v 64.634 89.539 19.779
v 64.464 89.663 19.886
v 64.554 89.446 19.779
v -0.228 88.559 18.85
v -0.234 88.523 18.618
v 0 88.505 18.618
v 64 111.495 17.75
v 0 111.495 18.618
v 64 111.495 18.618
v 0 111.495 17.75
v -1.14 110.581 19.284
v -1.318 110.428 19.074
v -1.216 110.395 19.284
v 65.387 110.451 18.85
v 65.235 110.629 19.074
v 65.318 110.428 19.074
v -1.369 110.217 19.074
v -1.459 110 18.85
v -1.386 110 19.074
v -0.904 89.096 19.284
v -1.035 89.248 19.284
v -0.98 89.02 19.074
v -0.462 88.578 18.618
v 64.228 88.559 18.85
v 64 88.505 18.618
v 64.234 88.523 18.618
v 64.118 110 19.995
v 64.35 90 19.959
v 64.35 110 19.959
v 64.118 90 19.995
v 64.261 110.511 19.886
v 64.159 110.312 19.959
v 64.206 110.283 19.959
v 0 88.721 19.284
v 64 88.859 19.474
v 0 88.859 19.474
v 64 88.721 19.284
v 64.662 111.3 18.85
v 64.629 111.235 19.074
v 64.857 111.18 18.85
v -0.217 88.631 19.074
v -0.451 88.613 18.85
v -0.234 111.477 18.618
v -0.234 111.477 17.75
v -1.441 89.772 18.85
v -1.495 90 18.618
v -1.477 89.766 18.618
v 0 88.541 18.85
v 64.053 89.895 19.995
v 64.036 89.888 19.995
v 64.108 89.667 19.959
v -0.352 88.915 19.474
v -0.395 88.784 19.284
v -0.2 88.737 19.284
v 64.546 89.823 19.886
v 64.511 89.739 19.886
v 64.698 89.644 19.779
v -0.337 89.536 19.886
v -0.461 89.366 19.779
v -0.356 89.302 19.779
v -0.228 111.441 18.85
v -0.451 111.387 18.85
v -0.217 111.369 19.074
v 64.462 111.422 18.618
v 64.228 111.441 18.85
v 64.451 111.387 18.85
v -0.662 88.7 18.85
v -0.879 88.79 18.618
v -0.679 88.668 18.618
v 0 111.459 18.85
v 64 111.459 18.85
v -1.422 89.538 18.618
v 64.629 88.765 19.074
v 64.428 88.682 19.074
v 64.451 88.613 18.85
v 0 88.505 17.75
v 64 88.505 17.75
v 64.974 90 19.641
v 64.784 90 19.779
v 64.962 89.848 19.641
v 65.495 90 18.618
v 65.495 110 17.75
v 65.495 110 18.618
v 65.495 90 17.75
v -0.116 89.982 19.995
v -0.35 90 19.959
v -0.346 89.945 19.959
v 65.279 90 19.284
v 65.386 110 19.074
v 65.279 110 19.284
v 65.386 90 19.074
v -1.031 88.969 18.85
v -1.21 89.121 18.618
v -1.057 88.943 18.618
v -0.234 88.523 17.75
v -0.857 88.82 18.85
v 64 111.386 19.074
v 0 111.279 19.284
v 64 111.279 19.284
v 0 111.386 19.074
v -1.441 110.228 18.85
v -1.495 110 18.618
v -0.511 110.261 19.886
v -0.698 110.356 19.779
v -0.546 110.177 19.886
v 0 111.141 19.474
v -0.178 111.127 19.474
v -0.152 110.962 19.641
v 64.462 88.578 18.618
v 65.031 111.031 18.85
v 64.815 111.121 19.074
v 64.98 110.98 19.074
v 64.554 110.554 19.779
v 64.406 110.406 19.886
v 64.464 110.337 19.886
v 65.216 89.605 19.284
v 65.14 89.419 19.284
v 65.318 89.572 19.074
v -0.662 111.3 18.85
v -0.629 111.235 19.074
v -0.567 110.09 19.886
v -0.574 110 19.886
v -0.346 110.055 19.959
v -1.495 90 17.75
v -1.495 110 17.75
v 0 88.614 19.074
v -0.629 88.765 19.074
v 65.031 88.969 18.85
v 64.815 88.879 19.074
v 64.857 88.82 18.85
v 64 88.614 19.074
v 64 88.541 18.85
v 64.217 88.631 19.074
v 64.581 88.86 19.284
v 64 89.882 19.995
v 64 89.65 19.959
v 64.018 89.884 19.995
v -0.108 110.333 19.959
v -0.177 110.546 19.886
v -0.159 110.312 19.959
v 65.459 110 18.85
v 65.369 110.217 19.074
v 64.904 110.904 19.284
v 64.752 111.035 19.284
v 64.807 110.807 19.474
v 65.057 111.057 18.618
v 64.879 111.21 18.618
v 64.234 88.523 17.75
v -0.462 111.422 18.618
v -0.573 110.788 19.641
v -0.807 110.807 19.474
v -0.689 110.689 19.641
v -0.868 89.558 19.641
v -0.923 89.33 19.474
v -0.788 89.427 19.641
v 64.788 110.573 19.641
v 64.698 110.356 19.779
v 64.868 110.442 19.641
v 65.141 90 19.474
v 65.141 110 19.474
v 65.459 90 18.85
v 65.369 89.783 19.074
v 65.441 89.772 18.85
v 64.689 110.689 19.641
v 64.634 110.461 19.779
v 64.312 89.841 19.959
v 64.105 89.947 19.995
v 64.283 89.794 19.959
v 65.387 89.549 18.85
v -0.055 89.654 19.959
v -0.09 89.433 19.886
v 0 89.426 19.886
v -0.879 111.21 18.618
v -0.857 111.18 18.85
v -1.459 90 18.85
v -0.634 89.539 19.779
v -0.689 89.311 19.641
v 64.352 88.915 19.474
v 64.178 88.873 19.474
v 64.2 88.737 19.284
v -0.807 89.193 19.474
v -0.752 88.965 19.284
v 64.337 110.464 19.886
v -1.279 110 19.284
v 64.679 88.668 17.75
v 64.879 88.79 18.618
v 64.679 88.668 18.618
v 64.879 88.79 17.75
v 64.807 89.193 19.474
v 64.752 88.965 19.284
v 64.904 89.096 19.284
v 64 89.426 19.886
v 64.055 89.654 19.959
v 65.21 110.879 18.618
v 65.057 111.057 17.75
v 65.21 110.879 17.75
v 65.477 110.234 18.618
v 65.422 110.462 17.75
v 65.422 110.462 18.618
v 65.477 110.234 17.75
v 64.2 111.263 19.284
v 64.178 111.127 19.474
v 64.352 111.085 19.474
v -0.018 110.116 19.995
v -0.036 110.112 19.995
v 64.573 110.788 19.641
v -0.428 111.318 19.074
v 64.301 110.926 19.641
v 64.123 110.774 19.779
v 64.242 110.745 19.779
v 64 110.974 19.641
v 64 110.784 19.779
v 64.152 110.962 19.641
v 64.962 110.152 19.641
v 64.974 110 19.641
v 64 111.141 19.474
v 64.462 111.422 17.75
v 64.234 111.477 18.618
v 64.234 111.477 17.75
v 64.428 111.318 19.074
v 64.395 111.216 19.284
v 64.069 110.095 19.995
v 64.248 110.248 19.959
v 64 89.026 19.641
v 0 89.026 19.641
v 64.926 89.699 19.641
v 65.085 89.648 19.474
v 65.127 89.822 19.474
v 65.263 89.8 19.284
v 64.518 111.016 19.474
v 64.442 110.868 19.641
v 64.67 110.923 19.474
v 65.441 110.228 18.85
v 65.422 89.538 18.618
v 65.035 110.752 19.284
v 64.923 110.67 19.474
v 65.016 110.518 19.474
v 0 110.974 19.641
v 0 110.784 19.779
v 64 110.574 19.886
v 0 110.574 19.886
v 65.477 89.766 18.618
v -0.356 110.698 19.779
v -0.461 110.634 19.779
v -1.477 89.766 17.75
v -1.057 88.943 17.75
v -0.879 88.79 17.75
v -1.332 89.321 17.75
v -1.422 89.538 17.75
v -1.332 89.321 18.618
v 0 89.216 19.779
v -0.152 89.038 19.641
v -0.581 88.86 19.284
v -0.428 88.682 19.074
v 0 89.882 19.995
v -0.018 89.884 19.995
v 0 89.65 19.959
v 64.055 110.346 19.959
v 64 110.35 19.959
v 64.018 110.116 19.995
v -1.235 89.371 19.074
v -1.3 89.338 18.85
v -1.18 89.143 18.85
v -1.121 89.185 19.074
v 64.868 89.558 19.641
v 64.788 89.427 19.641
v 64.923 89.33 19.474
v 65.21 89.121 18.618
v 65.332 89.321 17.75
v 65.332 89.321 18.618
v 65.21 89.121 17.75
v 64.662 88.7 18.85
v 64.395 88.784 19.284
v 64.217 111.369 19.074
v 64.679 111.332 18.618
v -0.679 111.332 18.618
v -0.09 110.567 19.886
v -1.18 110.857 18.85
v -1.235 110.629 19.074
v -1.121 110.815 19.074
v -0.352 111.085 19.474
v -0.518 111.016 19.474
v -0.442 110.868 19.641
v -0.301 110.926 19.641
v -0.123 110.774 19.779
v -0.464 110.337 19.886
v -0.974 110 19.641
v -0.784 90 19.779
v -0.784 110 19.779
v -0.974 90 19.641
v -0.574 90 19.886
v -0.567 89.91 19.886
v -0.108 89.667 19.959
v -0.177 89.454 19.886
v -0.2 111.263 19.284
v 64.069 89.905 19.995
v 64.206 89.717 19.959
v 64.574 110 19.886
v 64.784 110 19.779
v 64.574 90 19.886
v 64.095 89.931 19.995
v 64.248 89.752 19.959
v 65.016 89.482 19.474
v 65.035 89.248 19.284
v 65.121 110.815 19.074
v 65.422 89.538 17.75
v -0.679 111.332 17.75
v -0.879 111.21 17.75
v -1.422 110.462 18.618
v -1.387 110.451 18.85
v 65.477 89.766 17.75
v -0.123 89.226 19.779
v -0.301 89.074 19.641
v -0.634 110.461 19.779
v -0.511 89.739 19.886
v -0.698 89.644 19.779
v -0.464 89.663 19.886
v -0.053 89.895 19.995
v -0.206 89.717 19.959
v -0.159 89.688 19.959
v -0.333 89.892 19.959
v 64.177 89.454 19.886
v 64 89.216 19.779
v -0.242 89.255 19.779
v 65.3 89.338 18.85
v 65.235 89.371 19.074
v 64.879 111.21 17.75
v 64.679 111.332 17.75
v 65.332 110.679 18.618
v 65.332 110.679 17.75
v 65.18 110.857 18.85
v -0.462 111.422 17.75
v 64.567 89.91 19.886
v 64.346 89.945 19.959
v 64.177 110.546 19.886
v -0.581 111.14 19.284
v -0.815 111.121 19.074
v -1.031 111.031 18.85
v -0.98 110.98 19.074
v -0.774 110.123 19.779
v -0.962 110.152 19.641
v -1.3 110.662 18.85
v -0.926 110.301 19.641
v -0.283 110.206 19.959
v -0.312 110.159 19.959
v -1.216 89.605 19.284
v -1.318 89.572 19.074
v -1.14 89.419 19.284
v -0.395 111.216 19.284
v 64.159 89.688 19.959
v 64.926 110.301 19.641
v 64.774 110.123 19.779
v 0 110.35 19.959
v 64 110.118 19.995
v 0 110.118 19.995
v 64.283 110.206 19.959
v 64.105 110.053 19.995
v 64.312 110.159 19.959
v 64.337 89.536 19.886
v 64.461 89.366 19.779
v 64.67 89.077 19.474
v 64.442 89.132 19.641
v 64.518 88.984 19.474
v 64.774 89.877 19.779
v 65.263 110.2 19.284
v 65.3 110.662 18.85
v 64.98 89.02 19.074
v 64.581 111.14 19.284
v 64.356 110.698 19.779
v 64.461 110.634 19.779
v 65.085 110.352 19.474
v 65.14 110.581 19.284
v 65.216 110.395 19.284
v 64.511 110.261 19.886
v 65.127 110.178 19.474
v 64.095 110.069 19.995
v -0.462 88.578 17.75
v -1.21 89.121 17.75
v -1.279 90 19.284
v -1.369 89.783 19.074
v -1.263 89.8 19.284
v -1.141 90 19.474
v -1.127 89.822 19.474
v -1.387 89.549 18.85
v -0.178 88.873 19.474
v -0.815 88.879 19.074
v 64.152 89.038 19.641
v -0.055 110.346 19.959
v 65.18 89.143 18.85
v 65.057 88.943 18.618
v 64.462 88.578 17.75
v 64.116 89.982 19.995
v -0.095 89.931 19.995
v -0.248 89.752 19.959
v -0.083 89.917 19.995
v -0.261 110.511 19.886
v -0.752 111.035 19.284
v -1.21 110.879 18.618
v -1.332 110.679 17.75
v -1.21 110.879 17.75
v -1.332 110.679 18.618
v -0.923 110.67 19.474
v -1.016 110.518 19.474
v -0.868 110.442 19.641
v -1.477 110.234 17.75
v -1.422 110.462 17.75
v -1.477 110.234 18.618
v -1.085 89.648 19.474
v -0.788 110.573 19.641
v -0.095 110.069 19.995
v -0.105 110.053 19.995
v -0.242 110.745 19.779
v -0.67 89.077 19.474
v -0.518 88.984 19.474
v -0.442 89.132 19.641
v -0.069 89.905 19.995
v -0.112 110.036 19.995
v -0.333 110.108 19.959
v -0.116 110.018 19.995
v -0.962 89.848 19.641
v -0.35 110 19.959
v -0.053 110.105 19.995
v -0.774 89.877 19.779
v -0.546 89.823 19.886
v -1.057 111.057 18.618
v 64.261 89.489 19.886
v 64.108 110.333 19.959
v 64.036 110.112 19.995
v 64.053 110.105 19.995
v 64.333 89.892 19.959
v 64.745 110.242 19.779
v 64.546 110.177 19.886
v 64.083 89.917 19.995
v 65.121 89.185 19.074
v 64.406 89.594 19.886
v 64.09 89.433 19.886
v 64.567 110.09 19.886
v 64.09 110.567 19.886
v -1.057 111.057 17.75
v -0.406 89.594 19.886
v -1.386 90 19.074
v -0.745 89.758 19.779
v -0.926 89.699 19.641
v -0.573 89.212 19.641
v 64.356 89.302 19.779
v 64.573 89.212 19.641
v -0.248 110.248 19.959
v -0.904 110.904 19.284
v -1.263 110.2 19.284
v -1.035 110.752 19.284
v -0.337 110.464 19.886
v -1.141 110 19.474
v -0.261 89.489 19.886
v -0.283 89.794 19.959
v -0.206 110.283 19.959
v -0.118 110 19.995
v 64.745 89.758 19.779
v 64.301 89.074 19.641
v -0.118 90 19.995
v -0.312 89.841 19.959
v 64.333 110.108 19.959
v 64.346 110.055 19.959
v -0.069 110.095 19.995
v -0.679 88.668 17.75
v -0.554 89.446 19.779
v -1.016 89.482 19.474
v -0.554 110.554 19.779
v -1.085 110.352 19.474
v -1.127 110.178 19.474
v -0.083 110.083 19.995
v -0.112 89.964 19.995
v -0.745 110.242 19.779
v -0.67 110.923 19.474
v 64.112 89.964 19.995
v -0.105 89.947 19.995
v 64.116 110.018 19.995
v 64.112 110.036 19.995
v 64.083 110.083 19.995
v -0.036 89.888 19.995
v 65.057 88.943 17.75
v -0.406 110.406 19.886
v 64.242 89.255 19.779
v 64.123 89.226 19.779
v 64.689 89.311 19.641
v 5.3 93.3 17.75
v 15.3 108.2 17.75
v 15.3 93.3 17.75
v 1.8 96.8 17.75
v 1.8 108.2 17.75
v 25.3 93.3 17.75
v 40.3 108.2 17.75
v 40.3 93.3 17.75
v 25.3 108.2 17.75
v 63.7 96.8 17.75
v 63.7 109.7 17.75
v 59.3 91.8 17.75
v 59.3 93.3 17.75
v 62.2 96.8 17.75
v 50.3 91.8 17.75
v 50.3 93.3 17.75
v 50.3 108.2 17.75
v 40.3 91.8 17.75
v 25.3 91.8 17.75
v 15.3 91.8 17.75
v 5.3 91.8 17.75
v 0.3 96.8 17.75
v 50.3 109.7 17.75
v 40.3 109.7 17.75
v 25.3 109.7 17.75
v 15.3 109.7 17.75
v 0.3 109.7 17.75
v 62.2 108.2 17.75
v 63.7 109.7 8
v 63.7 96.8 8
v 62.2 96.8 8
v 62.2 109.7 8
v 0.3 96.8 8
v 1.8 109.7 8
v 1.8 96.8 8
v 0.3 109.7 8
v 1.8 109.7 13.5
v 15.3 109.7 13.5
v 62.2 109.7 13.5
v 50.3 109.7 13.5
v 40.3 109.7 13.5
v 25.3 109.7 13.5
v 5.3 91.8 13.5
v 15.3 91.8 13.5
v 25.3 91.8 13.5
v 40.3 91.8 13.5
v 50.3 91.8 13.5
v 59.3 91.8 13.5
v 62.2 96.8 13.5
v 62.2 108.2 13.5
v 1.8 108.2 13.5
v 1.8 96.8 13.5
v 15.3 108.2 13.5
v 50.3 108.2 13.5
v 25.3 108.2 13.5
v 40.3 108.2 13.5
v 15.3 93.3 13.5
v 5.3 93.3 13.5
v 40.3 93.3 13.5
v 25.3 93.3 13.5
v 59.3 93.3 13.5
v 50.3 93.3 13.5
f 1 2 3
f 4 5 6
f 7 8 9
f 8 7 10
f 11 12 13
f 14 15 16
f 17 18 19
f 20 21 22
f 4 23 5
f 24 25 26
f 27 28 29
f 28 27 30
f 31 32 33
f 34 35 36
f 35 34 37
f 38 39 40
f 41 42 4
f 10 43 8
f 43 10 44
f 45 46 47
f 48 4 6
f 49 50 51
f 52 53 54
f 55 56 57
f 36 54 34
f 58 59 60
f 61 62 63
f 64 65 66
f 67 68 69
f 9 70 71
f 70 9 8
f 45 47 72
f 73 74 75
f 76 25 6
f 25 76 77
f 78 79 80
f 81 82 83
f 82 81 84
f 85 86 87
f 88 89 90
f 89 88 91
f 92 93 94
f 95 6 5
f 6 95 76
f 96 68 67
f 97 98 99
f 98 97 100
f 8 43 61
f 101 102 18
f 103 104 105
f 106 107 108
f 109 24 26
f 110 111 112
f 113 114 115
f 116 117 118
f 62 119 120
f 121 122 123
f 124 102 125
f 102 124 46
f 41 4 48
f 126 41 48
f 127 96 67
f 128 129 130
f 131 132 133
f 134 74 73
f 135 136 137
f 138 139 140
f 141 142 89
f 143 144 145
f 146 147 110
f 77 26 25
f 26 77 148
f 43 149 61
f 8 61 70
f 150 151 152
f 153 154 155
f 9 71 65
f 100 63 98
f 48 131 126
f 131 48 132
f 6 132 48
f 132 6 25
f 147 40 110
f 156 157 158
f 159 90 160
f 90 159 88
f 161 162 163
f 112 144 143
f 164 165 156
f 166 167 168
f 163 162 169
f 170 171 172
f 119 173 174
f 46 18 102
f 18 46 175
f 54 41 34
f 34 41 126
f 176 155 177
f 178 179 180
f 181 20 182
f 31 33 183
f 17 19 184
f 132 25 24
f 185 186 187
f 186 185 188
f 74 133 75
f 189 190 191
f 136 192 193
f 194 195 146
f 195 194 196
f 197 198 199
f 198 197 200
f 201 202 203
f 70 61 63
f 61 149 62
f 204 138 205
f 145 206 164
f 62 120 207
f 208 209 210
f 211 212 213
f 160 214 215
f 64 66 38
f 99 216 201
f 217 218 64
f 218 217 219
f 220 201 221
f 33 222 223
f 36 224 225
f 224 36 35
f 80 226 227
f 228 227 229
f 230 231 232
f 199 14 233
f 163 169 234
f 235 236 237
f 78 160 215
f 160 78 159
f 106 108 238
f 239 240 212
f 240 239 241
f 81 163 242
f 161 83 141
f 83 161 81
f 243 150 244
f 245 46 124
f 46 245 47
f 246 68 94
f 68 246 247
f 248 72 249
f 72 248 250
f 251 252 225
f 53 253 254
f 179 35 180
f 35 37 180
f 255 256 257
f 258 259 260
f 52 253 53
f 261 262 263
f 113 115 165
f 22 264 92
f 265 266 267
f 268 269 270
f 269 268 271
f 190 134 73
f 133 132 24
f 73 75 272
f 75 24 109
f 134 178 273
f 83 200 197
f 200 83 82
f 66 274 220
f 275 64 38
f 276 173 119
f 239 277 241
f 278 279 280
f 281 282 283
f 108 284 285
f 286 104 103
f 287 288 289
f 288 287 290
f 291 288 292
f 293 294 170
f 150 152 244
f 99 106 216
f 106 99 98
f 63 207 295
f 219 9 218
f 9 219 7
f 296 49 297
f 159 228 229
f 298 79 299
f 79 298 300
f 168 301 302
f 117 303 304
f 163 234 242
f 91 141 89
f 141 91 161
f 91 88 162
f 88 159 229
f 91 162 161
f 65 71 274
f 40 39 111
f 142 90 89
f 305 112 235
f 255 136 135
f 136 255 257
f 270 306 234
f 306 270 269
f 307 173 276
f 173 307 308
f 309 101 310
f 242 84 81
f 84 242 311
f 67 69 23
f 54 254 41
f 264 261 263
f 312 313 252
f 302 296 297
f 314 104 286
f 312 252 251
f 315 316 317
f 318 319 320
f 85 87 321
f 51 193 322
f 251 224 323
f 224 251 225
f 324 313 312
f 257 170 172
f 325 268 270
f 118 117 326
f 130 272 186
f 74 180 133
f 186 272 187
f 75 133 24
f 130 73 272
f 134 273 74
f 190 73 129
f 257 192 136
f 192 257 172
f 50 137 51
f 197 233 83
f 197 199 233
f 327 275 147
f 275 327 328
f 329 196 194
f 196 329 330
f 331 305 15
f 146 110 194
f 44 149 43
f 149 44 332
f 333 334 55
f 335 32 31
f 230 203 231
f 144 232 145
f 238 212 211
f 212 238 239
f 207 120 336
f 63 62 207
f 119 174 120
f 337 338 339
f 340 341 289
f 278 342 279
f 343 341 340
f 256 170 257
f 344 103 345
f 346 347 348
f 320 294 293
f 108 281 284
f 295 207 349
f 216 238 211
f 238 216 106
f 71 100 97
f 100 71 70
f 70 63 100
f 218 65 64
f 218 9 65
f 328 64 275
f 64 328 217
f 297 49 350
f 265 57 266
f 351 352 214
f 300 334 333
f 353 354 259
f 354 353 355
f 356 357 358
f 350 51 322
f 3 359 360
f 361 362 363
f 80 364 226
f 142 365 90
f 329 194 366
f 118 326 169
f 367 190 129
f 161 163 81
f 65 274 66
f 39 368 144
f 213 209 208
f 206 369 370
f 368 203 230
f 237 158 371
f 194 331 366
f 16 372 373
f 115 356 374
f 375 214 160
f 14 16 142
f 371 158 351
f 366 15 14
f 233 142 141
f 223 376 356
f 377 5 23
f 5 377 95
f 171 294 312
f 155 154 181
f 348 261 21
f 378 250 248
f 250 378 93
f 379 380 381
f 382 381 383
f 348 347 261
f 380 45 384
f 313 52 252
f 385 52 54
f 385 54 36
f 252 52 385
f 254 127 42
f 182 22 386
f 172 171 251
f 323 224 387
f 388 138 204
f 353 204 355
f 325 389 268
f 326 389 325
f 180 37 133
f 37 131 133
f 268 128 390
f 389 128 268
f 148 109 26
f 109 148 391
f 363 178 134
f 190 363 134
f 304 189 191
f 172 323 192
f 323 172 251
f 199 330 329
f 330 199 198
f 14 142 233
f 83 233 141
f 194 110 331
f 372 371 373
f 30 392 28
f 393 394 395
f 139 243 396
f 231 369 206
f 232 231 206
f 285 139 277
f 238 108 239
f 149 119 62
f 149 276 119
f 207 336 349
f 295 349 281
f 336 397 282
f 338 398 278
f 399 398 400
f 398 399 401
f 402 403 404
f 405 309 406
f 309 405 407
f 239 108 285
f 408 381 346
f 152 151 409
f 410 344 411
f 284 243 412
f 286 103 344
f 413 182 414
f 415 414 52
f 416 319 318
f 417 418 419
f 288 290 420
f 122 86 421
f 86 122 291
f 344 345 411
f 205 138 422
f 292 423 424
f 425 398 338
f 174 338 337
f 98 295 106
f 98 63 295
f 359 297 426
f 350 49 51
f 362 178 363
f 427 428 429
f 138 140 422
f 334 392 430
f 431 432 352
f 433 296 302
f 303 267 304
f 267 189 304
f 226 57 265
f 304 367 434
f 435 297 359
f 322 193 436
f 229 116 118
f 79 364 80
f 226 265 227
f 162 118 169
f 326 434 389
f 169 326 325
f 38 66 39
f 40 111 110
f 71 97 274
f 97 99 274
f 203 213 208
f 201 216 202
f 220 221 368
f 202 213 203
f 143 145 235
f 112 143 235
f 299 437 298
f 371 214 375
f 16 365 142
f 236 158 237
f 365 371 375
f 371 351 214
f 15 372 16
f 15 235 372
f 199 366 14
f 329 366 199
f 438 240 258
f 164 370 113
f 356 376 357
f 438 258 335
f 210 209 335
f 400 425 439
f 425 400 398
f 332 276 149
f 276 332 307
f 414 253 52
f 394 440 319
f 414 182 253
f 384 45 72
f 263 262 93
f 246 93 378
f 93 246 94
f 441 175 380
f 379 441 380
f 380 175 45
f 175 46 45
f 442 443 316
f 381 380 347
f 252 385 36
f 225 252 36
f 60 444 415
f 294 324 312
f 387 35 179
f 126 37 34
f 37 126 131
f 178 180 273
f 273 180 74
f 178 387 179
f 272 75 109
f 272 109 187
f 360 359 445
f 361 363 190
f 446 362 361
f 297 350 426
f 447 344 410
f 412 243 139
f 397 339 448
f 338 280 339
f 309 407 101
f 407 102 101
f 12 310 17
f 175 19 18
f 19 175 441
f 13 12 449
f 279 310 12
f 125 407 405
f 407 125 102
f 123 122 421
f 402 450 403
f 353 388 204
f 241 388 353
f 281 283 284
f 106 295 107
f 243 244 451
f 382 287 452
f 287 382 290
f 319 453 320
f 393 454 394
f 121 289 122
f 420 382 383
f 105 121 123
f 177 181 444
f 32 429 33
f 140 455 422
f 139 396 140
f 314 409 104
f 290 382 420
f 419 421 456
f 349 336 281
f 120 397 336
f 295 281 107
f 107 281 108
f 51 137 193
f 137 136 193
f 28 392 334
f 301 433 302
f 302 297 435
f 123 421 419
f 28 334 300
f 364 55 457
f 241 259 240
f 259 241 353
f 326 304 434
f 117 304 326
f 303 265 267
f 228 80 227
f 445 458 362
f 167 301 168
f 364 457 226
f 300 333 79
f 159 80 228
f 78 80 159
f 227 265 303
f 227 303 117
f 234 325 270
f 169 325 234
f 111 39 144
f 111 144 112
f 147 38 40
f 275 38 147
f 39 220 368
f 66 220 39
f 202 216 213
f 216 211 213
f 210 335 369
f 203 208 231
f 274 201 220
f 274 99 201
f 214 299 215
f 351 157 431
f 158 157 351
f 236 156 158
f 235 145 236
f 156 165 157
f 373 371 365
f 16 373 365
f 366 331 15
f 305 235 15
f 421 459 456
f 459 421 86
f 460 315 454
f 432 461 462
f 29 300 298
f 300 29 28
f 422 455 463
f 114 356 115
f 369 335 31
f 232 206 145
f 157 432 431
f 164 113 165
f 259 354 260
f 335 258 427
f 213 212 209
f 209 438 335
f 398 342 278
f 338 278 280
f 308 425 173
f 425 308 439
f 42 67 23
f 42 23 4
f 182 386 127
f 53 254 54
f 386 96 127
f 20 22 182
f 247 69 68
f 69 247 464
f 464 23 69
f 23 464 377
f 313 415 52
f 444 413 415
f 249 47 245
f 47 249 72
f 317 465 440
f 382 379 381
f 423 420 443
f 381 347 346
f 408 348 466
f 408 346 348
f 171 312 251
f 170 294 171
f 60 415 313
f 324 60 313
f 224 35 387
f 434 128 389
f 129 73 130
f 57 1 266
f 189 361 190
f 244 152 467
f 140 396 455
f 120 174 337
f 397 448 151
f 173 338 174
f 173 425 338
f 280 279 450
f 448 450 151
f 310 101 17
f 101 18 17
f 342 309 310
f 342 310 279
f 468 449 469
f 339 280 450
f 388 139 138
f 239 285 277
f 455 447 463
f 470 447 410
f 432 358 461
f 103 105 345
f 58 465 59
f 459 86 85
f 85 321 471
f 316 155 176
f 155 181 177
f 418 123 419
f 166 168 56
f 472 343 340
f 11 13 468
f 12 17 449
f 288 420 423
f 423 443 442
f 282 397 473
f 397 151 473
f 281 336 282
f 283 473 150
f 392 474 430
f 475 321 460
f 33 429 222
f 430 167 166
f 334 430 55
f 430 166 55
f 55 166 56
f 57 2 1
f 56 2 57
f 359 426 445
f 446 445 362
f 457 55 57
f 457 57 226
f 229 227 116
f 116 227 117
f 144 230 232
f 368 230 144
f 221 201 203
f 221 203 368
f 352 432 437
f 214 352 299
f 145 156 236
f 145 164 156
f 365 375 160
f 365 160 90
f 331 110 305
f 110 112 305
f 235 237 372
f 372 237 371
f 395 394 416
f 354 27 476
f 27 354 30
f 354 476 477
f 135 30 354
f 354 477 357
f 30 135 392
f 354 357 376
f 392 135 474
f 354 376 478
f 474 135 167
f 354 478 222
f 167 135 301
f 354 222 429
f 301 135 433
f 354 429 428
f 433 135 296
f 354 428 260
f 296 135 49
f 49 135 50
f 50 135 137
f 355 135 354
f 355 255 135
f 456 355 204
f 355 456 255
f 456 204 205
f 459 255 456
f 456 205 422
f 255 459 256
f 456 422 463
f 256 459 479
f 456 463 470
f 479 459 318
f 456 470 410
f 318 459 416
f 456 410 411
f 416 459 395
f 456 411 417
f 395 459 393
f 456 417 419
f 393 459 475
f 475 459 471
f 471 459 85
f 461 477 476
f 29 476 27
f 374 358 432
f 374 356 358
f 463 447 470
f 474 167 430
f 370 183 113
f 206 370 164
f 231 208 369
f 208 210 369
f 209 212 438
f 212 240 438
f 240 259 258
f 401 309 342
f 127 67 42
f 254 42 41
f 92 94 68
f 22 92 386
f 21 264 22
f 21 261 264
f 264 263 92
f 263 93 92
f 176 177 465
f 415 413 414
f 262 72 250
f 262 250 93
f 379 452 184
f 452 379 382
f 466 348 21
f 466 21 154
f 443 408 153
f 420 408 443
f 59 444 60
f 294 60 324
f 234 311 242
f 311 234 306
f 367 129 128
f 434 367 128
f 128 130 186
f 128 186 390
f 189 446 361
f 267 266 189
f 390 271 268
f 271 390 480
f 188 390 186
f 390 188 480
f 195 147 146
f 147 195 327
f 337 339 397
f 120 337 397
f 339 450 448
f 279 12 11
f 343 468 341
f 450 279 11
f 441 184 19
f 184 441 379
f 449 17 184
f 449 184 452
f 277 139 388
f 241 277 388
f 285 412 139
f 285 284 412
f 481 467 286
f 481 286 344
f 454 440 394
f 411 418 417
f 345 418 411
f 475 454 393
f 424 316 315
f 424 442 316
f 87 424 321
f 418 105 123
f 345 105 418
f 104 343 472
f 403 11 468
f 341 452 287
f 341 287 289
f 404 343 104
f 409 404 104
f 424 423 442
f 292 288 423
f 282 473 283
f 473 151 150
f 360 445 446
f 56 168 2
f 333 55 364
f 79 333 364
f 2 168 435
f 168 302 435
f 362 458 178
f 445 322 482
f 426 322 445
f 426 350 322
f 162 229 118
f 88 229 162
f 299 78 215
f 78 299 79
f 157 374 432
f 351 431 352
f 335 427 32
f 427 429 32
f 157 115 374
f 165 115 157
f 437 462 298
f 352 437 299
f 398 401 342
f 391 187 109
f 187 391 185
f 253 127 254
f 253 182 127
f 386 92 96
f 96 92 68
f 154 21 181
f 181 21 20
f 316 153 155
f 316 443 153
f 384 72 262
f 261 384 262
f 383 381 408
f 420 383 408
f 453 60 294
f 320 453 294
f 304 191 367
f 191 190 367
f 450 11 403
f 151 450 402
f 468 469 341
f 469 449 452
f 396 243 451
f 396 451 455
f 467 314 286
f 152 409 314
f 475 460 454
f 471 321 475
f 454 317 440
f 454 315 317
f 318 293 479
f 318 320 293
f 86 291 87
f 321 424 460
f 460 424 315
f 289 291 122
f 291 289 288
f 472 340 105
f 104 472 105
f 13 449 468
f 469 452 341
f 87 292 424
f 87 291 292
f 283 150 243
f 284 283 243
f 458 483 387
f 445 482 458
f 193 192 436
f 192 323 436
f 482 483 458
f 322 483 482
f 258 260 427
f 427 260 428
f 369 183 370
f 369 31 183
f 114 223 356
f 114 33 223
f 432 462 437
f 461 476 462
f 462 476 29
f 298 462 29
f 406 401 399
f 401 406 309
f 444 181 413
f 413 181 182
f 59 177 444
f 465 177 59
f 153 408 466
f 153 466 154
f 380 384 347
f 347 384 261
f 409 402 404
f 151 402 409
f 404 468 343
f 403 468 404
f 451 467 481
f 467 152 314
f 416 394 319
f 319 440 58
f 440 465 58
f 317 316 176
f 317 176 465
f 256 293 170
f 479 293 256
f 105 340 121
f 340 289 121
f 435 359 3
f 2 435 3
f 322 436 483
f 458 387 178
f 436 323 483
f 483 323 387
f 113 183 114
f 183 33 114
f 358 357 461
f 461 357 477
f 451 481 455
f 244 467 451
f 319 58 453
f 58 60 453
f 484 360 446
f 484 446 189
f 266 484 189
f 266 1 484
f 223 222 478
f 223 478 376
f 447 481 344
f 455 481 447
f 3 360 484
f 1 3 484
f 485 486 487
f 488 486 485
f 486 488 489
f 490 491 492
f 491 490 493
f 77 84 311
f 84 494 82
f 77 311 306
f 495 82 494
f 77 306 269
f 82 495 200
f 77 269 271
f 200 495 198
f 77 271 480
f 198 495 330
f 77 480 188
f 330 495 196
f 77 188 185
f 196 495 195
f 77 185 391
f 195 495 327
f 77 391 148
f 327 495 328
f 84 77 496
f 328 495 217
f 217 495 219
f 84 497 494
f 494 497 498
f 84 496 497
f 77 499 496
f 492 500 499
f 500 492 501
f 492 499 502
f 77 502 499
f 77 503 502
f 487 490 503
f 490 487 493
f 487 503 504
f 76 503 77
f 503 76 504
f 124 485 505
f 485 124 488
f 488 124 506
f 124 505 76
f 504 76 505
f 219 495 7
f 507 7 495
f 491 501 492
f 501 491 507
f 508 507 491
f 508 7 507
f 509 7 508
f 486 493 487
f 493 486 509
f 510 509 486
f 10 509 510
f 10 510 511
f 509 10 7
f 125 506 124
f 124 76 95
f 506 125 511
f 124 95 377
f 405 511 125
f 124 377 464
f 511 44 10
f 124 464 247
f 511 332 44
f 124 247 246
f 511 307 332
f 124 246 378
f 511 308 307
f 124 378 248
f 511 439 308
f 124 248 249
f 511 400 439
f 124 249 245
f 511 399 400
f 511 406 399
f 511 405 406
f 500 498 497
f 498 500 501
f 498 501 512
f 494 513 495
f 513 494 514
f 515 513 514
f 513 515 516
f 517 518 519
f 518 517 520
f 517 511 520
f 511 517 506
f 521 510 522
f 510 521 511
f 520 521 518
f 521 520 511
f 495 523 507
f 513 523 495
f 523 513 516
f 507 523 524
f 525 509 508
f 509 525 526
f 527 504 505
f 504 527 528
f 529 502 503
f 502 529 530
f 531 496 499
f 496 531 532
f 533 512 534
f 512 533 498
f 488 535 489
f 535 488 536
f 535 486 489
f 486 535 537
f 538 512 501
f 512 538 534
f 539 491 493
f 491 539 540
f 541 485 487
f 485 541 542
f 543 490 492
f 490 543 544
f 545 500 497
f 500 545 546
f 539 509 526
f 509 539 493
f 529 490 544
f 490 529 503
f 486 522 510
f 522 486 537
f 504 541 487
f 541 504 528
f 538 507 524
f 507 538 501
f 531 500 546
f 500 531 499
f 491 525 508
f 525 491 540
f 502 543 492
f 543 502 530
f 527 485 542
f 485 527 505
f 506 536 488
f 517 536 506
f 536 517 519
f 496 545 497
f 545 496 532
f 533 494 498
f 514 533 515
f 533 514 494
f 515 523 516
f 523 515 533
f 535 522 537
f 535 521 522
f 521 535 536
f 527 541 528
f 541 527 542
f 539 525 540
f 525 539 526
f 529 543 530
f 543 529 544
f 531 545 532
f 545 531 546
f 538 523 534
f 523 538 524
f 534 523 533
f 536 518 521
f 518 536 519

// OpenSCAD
$fn=40;  // Alto número de caras de polígonos

/********************************************
*** TAPA WIMUMO 005 
********************************************/

ap = 1.5; // ancho pared
ai = 17; // alto interno 
xi = 64; // largo interno en x
yi = 110; // largo en y
cp = 2; // cubre-plug
ypcb = 85;// largo pcb

difference(){
    
    // Cuerpo de la tapa 
    union(){
        intersection(){
            
            //caja_completa();
            // obtengo la tapa
            //translate([-5,-5,ai]){cube([80,82,20]);};
        }
        
        // TAPA PRINCIPAL
        translate([0,0,ai]){caja_tapa(ap,ap,xi,ypcb+ap);}
        // borde
        alto_b = ai-3-1.7;
        margen = 0.3;
        reborde(0+margen,0+cp+margen,ai-alto_b+1,
        ypcb-2*margen,xi-2*margen,1.5,alto_b);
        
        // TAPA BATERIAS
        translate([0,ypcb+cp+2*ap,ai]){
            caja_tapa(ap,ap,xi,yi-ypcb-cp-2*ap);
         }
        alto_tb = 10 ;
        difference(){
        reborde(0+margen,ypcb+cp+3*ap+margen,ai-alto_tb+1,
        yi-ypcb-cp-ap*3-2*margen,xi-2*margen,1.5,alto_tb);
            
         translate([margen+ap,ypcb+cp+2*ap,6]){cube([xi-2*margen-2*ap,20,ai-ap-8]);}
        //translate([]){cube([]);}
        }
        
       
        
    };
    
    // Agujeros para botones
    px = 6+2;       // posicion de los postes
    py = 6+cp+2;
    
    // LED
     translate([px+10,py+68-3.22,ai-5]){cylinder(10,3,3);}
    // Reset
    translate([px+18.78,py+68-3.22,ai-5]){cylinder(10,1.5,1.5);};
    // Tecla ON/OFF
    htec = 11;
    translate([px+26.5,py+68-3.22-htec/2,ai-5]){
        cube([42-26.5,htec,16]);
     };
     
    
    translate([-ap,-ap,0]){cube([2*ap+xi,3*ap+ypcb,20]);}
     
    
}

/* reborde */
module reborde(x,y,z,w,l,a,h){
    translate([x,y,z]){
      difference(){
        // Gran borde
        cube([l,w,h]);
        // Hueco
        translate([a,a,-1]){
          cube([l-2*a,w-2*a,h+2]);
        }
        // Ranuras para formar solapas
        // frente y atras
        translate([15,-5,-7]){
          cube([10,120,ai]);
        }
        translate([40,-5,-7]){
          cube([10,120,ai]);
        }
        // esquineras
        translate([-5,-5,-7]){
          cube([10,10,ai]);
        }
        translate([xi-5,-5,-7]){
          cube([10,10,ai]);
        }
        translate([-5,ypcb-5,-7]){
          cube([10,15,ai]);
        }
        translate([xi-5,ypcb-5,-7]){
          cube([10,15,ai]);
        }
        // Laterales
        translate([-5,ypcb/2-5,-7]){
          cube([10,10,ai]);
        }
        translate([xi-5,ypcb/2-5,-7]){
          cube([10,10,ai]);
        }
        
      }
    
    };

}


/* CAJA */
module caja_completa(){
// Caja completa
    
ap = 1.5; // ancho pared
ai = 17; // alto interno 
xi = 64; // largo interno en x
yi = 110;
cp = 2; // cubre-plug
ypcb = 85;// largo pcb

union(){
    
difference(){
    // Caja completa
    union(){
        difference(){
            // Casco de la caja
            caja(ap,ai,xi,yi);
            
            // Hueco principal de la caja
            translate([0,cp,0]){cube([xi,yi-cp,ai+0.1]);};
            
            //hueco de los cables
            translate([0,cp+2,0]){huecoCables();};
        }

        translate([2,cp+2,0]){postes();}
        
        // Pared separadora batería
        translate([0,cp+ypcb,0]){
        cube([xi,ap*3,ai]);
        };
        
       
        
  
    };
    
    // Saco la tapa
    translate([-5,-5,ai]){cube([80,150,20]);};
    
    // Hago una zanja y agujeritos para que pasen los cables del 
    // portapilas
        caladuraCablesPilas();
        translate([xi-4,0,0]){
            caladuraCablesPilas();
         };
    };

}

}


/*
*   MODULOS PARA LA CAJA
*/

//Cuerpo Caja inferior    
module caja(ap,ai,xi,yi){
    hull() {
        // Vertice A
        translate([0,0,0])
            sphere(r=ap);
        translate([0,0,ai])   
            sphere(r=ap);
        // Vertice B        
        translate([0,yi,0])
          sphere(r=ap);
        translate([0,yi,ai])   
         sphere(r=ap);        
        // Vertice C     
        translate([xi,0,0]) 
            sphere(r=ap);
        translate([xi,0,ai])   
            sphere(r=ap);   
        // Vertice D     
        translate([xi,yi,0])
            sphere(r=ap);
        translate([xi,yi,ai])   
            sphere(r=ap);   
    } 
};

module caja_tapa(ap,ai,xi,yi){
 difference(){
        hull() {
        // Vertice A
        translate([0,0,0])
            sphere(r=ap);
        translate([0,0,ai])   
            sphere(r=ap);
        // Vertice B        
        translate([0,yi,0])
          sphere(r=ap);
        translate([0,yi,ai])   
         sphere(r=ap);        
        // Vertice C     
        translate([xi,0,0]) 
            sphere(r=ap);
        translate([xi,0,ai])   
            sphere(r=ap);   
        // Vertice D     
        translate([xi,yi,0])
            sphere(r=ap);
        translate([xi,yi,ai])   
            sphere(r=ap);   
    } 
        translate([-5,-5,ai-ap/2-10]){cube([80,120,10]);}
    }
   
};



module caladuraCablesPilas(){
    translate([-1,91.5,-1]){
        cube([6,15,5]);
        };
     translate([2,95,2]){
        rotate([90,0,0]){
         cylinder(10,2,2);
        }
        };
        
}

module huecoCables(){
    borde = 9;
    dist = 12;
    a = 12;
    rad = 3;
    largo = 10;
    translate([borde+dist,0,a]){
            rotate([90,90,0]){cylinder(h=largo,r=rad);}
        }
    translate([borde+dist*3,0,a]){
            rotate([90,90,0]){cylinder(h=largo,r=rad);}
        }
}
// Postes placa 
module postes(){
    
    translate([6,6,0]){   
        poste();
    }
    translate([6+48,6,0]){
       poste();
    }
     translate([6,6+68,0]){
       poste();
    }
    translate([6+48,6+68,0]){
       poste();
    }
}

module poste(){ 
  difference(){
    union(){
    cylinder(8, 2.7, 2.7);
    cylinder(2.5, 5, 5);        
    }
    cylinder(10, 1, 1);
  }
}
